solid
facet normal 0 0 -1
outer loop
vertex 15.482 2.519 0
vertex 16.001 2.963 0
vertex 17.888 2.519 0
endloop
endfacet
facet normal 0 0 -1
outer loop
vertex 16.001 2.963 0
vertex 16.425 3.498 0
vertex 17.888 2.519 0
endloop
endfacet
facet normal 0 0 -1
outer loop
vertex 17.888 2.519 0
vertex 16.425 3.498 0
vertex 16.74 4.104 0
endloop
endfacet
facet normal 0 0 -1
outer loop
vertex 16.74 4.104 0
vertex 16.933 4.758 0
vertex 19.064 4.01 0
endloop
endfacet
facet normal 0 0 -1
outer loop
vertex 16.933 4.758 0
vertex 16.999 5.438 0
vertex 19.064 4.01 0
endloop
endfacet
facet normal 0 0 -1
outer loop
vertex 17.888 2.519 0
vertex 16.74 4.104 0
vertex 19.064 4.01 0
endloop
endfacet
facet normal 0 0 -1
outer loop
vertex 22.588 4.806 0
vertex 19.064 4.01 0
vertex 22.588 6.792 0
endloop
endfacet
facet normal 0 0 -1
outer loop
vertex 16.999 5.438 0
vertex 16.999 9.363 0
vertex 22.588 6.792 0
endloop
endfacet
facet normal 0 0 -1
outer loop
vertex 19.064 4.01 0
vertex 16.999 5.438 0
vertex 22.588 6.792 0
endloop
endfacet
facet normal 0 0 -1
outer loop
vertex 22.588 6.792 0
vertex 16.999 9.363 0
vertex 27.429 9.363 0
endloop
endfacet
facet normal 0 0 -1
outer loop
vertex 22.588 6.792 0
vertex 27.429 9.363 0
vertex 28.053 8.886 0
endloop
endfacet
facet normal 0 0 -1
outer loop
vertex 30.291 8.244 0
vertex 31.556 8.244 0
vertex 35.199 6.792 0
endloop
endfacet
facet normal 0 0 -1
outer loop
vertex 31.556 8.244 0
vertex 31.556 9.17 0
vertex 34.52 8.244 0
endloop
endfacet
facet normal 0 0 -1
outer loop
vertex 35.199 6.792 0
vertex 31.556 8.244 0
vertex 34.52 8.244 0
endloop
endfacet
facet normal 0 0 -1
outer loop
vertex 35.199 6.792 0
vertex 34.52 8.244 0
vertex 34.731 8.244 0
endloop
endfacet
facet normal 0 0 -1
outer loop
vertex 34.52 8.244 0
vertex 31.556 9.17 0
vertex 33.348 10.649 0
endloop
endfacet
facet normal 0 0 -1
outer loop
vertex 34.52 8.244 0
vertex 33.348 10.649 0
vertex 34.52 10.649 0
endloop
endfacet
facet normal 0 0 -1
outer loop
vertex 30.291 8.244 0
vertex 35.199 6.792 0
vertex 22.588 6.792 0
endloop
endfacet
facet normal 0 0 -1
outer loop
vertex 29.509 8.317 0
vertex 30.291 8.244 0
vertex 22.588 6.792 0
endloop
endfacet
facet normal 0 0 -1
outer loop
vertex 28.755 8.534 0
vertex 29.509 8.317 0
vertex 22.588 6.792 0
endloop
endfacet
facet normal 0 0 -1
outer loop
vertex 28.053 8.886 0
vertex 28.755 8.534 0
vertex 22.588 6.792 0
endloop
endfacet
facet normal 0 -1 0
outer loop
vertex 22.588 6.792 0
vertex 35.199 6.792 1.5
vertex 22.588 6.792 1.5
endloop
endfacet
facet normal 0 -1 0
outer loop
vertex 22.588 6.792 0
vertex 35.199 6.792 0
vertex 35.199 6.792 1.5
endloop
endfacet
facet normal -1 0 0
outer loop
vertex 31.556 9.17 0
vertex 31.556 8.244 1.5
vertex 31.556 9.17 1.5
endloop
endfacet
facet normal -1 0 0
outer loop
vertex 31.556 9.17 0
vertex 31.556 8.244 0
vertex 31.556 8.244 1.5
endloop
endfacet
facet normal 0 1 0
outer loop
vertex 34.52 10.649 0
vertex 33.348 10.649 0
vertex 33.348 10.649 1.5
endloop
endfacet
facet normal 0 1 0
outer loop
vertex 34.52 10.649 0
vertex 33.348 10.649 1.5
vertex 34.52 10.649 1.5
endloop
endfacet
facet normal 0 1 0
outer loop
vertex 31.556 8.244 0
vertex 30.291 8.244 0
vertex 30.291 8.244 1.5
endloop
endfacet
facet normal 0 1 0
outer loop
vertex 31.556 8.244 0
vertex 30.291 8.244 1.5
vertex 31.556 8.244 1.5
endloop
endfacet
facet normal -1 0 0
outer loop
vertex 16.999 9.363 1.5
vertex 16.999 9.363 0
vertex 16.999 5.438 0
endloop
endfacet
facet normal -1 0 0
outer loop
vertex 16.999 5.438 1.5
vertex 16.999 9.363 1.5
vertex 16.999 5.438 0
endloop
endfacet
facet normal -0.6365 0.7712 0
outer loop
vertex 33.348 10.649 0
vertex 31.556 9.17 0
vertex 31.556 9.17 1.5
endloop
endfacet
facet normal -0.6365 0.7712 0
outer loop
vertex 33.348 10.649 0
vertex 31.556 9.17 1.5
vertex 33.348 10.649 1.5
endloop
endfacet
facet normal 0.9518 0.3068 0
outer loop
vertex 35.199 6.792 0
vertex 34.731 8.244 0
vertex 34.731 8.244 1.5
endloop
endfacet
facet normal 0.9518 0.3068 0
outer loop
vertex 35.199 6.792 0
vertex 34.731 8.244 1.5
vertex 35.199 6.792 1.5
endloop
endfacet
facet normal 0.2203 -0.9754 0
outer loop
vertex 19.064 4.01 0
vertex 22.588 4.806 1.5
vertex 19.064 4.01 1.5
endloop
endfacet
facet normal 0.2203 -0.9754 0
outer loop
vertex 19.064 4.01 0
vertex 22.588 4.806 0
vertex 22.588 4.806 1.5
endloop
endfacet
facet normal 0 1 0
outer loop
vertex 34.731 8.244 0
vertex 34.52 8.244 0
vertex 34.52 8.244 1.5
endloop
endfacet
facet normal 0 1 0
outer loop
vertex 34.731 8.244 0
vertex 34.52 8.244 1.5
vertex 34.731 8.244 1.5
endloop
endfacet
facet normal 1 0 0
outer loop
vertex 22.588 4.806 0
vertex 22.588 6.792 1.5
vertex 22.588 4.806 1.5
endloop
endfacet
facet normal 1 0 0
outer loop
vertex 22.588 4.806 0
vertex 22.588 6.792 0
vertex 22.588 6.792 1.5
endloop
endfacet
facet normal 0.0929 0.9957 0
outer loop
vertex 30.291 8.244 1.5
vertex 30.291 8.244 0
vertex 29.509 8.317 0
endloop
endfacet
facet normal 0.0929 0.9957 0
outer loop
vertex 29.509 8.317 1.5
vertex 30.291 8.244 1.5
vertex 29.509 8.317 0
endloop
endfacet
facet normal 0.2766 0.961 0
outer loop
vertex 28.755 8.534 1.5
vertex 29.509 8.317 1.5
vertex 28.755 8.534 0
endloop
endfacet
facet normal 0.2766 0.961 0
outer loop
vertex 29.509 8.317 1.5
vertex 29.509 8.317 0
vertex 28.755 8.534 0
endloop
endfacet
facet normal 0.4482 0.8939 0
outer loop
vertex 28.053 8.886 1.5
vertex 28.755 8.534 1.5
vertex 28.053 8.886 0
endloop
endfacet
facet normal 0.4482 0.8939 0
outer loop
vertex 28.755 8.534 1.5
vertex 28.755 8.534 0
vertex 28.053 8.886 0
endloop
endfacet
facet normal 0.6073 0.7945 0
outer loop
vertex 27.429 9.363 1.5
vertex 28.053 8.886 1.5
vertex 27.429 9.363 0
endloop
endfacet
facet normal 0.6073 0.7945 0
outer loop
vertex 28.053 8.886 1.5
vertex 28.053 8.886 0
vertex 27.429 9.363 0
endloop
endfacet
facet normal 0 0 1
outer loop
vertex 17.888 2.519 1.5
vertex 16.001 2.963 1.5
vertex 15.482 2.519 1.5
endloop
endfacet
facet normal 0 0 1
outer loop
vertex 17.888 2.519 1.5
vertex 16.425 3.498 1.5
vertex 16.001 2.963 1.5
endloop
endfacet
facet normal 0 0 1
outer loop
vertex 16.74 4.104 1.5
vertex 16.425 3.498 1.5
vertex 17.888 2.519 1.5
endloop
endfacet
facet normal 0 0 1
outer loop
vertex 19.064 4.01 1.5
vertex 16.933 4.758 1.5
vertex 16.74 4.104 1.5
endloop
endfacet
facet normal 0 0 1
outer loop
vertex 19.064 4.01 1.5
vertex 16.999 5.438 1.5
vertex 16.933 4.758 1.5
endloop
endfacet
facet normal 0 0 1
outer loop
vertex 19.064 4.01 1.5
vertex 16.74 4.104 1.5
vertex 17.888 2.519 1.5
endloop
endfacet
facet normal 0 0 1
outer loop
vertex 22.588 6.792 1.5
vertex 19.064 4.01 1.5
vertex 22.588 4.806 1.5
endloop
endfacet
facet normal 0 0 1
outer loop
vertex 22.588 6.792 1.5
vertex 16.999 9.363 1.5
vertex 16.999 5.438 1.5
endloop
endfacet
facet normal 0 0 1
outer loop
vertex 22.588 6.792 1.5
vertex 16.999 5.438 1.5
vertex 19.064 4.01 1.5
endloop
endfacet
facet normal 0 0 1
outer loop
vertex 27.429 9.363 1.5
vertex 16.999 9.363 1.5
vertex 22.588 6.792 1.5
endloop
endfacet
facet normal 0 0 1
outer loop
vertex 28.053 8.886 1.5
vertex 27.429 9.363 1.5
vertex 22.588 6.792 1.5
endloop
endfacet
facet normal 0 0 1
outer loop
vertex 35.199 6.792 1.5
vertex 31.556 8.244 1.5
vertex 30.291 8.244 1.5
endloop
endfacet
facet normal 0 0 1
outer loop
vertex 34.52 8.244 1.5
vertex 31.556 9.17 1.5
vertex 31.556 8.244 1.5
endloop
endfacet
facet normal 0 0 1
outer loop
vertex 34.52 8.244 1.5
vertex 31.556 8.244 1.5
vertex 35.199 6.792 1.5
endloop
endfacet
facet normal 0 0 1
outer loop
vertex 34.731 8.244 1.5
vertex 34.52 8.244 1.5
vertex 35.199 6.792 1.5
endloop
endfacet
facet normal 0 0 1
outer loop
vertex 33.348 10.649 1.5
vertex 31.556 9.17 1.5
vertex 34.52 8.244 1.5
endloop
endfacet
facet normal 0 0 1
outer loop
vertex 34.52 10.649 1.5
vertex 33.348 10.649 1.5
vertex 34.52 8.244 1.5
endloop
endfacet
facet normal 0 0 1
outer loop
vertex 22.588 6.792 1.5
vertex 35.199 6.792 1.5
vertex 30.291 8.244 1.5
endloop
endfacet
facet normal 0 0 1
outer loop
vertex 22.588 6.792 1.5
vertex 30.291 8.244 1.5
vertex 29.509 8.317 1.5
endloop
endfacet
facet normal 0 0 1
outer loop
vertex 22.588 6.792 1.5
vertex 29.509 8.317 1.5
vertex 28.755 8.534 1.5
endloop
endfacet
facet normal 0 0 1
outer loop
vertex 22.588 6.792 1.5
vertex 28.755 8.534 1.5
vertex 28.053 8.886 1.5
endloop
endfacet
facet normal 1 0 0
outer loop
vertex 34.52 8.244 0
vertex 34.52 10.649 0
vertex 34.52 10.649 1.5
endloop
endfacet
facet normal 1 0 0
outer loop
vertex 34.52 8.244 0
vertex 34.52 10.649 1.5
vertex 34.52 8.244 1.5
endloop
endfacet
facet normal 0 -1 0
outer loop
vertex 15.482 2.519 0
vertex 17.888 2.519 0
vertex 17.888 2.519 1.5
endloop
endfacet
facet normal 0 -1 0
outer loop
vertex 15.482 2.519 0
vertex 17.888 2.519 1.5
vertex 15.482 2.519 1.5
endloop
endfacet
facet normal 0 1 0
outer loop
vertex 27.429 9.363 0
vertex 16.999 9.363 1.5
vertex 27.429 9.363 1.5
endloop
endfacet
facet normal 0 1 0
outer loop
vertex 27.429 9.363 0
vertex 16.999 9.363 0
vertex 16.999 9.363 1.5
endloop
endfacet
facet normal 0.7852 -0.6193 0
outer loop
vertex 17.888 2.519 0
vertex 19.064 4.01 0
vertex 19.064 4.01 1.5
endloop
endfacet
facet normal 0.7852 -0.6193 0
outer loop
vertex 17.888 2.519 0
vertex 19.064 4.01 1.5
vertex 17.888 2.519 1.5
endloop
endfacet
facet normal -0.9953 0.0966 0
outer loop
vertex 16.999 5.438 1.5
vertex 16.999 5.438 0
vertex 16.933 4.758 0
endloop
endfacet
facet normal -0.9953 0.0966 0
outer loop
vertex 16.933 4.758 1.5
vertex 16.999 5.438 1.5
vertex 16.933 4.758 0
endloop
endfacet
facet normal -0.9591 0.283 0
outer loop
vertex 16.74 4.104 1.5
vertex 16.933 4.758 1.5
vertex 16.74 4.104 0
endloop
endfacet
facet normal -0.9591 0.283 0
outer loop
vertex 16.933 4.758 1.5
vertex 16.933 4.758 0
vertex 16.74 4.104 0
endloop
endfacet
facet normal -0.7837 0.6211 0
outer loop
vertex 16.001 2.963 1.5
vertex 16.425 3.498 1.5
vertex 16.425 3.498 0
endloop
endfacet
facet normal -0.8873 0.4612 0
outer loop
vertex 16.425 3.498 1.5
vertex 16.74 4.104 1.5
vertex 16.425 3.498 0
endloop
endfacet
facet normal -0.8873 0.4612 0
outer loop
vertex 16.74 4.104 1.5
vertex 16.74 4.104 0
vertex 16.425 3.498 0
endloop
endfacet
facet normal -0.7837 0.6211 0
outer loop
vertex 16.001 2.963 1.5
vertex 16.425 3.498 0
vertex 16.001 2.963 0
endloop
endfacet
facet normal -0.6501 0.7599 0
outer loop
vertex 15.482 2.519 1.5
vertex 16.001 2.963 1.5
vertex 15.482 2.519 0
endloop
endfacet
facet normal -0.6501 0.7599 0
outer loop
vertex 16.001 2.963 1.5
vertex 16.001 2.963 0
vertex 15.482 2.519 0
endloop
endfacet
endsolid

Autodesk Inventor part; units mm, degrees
ref_plane "YZ Plane" through (0, 0, 0) normal (1, 0, 0) x (0, 1, 0)
ref_plane "XZ Plane" through (0, 0, 0) normal (0, 1, 0) x (-1, 0, 0)
ref_plane "XY Plane" through (0, 0, 0) normal (0, 0, 1) x (1, 0, 0)
sketch "Sketch1" plane through (0, 0, 0) normal (0, 0, 1) x (1, 0, 0)
  line L0 (-27.669, 21.4051) -> (50.2215, 21.4051) construction
  line L1 (50.2215, 21.4051) -> (50.2215, -35.1456) construction
  line L2 (50.2215, -35.1456) -> (-27.669, -35.1456) construction
  line L3 (-27.669, -35.1456) -> (-27.669, 21.4051) construction
  line L4 (-25.2081, -35.2295) -> (52.6824, -35.2295) construction
  line L5 (16.9988, 9.3626) -> (27.4291, 9.3626)
  line L6 (30.2909, 8.2443) -> (31.5557, 8.2443)
  line L7 (31.5557, 8.2443) -> (31.5557, 9.1701)
  line L8 (31.5557, 9.1701) -> (33.3477, 10.6493)
  line L9 (33.3477, 10.6493) -> (34.52, 10.6493)
  line L10 (34.52, 10.6493) -> (34.52, 8.2443)
  line L11 (34.52, 8.2443) -> (34.7306, 8.2443)
  line L12 (34.7306, 8.2443) -> (35.1991, 6.7921)
  line L13 (35.1991, 6.7921) -> (22.5878, 6.7921)
  line L14 (22.5878, 6.7921) -> (22.5878, 4.8059)
  line L15 (22.5878, 4.8059) -> (19.0643, 4.0103)
  line L16 (19.0643, 4.0103) -> (17.8875, 2.5188)
  line L17 (17.8875, 2.5188) -> (15.4819, 2.5188)
  line L18 (16.9988, 9.3626) -> (16.9988, 5.4381)
  arc A0 (15.4819, 2.5188) -> (16.9988, 5.4381) centre (13.4312, 5.4381) ccw
  arc A1 (27.4291, 9.3626) -> (30.2909, 8.2443) centre (30.2909, 12.4655) ccw
  line L19 (36.8494, 6.7921) -> (35.3044, 6.7921)
  line L20 (36.8494, 6.7921) -> (35.3044, 6.7921) construction
  line L21 (36.8494, 6.7921) -> (35.3044, 6.7921) construction
  point P0 (0, 0)
  point P1 (26.4448, 6.7921)
  dimension "d1" = 77.8905
  dimension "d2" = 77.8905
extrude "Plate1" add sketch "Sketch1" along normal blind 1.5
equation "\"d2\" = d1"
equation "\"d31\" = Thickness"
equation "\"BendRadius\" = Thickness"
equation "\"BendReliefWidth\" = Thickness"
equation "\"BendReliefDepth\" = 0.5 * Thickness"
equation "\"CornerReliefSize\" = 4 * Thickness"
equation "\"MinimumRemnant\" = 2 * Thickness"
equation "\"TransitionRadius\" = BendRadius"
equation "\"JacobiRadiusSize\" = BendRadius"
equation "\"GapSize\" = Thickness"
equation "\"Thickness\" = 1.5"
properties part number "inner slider"
